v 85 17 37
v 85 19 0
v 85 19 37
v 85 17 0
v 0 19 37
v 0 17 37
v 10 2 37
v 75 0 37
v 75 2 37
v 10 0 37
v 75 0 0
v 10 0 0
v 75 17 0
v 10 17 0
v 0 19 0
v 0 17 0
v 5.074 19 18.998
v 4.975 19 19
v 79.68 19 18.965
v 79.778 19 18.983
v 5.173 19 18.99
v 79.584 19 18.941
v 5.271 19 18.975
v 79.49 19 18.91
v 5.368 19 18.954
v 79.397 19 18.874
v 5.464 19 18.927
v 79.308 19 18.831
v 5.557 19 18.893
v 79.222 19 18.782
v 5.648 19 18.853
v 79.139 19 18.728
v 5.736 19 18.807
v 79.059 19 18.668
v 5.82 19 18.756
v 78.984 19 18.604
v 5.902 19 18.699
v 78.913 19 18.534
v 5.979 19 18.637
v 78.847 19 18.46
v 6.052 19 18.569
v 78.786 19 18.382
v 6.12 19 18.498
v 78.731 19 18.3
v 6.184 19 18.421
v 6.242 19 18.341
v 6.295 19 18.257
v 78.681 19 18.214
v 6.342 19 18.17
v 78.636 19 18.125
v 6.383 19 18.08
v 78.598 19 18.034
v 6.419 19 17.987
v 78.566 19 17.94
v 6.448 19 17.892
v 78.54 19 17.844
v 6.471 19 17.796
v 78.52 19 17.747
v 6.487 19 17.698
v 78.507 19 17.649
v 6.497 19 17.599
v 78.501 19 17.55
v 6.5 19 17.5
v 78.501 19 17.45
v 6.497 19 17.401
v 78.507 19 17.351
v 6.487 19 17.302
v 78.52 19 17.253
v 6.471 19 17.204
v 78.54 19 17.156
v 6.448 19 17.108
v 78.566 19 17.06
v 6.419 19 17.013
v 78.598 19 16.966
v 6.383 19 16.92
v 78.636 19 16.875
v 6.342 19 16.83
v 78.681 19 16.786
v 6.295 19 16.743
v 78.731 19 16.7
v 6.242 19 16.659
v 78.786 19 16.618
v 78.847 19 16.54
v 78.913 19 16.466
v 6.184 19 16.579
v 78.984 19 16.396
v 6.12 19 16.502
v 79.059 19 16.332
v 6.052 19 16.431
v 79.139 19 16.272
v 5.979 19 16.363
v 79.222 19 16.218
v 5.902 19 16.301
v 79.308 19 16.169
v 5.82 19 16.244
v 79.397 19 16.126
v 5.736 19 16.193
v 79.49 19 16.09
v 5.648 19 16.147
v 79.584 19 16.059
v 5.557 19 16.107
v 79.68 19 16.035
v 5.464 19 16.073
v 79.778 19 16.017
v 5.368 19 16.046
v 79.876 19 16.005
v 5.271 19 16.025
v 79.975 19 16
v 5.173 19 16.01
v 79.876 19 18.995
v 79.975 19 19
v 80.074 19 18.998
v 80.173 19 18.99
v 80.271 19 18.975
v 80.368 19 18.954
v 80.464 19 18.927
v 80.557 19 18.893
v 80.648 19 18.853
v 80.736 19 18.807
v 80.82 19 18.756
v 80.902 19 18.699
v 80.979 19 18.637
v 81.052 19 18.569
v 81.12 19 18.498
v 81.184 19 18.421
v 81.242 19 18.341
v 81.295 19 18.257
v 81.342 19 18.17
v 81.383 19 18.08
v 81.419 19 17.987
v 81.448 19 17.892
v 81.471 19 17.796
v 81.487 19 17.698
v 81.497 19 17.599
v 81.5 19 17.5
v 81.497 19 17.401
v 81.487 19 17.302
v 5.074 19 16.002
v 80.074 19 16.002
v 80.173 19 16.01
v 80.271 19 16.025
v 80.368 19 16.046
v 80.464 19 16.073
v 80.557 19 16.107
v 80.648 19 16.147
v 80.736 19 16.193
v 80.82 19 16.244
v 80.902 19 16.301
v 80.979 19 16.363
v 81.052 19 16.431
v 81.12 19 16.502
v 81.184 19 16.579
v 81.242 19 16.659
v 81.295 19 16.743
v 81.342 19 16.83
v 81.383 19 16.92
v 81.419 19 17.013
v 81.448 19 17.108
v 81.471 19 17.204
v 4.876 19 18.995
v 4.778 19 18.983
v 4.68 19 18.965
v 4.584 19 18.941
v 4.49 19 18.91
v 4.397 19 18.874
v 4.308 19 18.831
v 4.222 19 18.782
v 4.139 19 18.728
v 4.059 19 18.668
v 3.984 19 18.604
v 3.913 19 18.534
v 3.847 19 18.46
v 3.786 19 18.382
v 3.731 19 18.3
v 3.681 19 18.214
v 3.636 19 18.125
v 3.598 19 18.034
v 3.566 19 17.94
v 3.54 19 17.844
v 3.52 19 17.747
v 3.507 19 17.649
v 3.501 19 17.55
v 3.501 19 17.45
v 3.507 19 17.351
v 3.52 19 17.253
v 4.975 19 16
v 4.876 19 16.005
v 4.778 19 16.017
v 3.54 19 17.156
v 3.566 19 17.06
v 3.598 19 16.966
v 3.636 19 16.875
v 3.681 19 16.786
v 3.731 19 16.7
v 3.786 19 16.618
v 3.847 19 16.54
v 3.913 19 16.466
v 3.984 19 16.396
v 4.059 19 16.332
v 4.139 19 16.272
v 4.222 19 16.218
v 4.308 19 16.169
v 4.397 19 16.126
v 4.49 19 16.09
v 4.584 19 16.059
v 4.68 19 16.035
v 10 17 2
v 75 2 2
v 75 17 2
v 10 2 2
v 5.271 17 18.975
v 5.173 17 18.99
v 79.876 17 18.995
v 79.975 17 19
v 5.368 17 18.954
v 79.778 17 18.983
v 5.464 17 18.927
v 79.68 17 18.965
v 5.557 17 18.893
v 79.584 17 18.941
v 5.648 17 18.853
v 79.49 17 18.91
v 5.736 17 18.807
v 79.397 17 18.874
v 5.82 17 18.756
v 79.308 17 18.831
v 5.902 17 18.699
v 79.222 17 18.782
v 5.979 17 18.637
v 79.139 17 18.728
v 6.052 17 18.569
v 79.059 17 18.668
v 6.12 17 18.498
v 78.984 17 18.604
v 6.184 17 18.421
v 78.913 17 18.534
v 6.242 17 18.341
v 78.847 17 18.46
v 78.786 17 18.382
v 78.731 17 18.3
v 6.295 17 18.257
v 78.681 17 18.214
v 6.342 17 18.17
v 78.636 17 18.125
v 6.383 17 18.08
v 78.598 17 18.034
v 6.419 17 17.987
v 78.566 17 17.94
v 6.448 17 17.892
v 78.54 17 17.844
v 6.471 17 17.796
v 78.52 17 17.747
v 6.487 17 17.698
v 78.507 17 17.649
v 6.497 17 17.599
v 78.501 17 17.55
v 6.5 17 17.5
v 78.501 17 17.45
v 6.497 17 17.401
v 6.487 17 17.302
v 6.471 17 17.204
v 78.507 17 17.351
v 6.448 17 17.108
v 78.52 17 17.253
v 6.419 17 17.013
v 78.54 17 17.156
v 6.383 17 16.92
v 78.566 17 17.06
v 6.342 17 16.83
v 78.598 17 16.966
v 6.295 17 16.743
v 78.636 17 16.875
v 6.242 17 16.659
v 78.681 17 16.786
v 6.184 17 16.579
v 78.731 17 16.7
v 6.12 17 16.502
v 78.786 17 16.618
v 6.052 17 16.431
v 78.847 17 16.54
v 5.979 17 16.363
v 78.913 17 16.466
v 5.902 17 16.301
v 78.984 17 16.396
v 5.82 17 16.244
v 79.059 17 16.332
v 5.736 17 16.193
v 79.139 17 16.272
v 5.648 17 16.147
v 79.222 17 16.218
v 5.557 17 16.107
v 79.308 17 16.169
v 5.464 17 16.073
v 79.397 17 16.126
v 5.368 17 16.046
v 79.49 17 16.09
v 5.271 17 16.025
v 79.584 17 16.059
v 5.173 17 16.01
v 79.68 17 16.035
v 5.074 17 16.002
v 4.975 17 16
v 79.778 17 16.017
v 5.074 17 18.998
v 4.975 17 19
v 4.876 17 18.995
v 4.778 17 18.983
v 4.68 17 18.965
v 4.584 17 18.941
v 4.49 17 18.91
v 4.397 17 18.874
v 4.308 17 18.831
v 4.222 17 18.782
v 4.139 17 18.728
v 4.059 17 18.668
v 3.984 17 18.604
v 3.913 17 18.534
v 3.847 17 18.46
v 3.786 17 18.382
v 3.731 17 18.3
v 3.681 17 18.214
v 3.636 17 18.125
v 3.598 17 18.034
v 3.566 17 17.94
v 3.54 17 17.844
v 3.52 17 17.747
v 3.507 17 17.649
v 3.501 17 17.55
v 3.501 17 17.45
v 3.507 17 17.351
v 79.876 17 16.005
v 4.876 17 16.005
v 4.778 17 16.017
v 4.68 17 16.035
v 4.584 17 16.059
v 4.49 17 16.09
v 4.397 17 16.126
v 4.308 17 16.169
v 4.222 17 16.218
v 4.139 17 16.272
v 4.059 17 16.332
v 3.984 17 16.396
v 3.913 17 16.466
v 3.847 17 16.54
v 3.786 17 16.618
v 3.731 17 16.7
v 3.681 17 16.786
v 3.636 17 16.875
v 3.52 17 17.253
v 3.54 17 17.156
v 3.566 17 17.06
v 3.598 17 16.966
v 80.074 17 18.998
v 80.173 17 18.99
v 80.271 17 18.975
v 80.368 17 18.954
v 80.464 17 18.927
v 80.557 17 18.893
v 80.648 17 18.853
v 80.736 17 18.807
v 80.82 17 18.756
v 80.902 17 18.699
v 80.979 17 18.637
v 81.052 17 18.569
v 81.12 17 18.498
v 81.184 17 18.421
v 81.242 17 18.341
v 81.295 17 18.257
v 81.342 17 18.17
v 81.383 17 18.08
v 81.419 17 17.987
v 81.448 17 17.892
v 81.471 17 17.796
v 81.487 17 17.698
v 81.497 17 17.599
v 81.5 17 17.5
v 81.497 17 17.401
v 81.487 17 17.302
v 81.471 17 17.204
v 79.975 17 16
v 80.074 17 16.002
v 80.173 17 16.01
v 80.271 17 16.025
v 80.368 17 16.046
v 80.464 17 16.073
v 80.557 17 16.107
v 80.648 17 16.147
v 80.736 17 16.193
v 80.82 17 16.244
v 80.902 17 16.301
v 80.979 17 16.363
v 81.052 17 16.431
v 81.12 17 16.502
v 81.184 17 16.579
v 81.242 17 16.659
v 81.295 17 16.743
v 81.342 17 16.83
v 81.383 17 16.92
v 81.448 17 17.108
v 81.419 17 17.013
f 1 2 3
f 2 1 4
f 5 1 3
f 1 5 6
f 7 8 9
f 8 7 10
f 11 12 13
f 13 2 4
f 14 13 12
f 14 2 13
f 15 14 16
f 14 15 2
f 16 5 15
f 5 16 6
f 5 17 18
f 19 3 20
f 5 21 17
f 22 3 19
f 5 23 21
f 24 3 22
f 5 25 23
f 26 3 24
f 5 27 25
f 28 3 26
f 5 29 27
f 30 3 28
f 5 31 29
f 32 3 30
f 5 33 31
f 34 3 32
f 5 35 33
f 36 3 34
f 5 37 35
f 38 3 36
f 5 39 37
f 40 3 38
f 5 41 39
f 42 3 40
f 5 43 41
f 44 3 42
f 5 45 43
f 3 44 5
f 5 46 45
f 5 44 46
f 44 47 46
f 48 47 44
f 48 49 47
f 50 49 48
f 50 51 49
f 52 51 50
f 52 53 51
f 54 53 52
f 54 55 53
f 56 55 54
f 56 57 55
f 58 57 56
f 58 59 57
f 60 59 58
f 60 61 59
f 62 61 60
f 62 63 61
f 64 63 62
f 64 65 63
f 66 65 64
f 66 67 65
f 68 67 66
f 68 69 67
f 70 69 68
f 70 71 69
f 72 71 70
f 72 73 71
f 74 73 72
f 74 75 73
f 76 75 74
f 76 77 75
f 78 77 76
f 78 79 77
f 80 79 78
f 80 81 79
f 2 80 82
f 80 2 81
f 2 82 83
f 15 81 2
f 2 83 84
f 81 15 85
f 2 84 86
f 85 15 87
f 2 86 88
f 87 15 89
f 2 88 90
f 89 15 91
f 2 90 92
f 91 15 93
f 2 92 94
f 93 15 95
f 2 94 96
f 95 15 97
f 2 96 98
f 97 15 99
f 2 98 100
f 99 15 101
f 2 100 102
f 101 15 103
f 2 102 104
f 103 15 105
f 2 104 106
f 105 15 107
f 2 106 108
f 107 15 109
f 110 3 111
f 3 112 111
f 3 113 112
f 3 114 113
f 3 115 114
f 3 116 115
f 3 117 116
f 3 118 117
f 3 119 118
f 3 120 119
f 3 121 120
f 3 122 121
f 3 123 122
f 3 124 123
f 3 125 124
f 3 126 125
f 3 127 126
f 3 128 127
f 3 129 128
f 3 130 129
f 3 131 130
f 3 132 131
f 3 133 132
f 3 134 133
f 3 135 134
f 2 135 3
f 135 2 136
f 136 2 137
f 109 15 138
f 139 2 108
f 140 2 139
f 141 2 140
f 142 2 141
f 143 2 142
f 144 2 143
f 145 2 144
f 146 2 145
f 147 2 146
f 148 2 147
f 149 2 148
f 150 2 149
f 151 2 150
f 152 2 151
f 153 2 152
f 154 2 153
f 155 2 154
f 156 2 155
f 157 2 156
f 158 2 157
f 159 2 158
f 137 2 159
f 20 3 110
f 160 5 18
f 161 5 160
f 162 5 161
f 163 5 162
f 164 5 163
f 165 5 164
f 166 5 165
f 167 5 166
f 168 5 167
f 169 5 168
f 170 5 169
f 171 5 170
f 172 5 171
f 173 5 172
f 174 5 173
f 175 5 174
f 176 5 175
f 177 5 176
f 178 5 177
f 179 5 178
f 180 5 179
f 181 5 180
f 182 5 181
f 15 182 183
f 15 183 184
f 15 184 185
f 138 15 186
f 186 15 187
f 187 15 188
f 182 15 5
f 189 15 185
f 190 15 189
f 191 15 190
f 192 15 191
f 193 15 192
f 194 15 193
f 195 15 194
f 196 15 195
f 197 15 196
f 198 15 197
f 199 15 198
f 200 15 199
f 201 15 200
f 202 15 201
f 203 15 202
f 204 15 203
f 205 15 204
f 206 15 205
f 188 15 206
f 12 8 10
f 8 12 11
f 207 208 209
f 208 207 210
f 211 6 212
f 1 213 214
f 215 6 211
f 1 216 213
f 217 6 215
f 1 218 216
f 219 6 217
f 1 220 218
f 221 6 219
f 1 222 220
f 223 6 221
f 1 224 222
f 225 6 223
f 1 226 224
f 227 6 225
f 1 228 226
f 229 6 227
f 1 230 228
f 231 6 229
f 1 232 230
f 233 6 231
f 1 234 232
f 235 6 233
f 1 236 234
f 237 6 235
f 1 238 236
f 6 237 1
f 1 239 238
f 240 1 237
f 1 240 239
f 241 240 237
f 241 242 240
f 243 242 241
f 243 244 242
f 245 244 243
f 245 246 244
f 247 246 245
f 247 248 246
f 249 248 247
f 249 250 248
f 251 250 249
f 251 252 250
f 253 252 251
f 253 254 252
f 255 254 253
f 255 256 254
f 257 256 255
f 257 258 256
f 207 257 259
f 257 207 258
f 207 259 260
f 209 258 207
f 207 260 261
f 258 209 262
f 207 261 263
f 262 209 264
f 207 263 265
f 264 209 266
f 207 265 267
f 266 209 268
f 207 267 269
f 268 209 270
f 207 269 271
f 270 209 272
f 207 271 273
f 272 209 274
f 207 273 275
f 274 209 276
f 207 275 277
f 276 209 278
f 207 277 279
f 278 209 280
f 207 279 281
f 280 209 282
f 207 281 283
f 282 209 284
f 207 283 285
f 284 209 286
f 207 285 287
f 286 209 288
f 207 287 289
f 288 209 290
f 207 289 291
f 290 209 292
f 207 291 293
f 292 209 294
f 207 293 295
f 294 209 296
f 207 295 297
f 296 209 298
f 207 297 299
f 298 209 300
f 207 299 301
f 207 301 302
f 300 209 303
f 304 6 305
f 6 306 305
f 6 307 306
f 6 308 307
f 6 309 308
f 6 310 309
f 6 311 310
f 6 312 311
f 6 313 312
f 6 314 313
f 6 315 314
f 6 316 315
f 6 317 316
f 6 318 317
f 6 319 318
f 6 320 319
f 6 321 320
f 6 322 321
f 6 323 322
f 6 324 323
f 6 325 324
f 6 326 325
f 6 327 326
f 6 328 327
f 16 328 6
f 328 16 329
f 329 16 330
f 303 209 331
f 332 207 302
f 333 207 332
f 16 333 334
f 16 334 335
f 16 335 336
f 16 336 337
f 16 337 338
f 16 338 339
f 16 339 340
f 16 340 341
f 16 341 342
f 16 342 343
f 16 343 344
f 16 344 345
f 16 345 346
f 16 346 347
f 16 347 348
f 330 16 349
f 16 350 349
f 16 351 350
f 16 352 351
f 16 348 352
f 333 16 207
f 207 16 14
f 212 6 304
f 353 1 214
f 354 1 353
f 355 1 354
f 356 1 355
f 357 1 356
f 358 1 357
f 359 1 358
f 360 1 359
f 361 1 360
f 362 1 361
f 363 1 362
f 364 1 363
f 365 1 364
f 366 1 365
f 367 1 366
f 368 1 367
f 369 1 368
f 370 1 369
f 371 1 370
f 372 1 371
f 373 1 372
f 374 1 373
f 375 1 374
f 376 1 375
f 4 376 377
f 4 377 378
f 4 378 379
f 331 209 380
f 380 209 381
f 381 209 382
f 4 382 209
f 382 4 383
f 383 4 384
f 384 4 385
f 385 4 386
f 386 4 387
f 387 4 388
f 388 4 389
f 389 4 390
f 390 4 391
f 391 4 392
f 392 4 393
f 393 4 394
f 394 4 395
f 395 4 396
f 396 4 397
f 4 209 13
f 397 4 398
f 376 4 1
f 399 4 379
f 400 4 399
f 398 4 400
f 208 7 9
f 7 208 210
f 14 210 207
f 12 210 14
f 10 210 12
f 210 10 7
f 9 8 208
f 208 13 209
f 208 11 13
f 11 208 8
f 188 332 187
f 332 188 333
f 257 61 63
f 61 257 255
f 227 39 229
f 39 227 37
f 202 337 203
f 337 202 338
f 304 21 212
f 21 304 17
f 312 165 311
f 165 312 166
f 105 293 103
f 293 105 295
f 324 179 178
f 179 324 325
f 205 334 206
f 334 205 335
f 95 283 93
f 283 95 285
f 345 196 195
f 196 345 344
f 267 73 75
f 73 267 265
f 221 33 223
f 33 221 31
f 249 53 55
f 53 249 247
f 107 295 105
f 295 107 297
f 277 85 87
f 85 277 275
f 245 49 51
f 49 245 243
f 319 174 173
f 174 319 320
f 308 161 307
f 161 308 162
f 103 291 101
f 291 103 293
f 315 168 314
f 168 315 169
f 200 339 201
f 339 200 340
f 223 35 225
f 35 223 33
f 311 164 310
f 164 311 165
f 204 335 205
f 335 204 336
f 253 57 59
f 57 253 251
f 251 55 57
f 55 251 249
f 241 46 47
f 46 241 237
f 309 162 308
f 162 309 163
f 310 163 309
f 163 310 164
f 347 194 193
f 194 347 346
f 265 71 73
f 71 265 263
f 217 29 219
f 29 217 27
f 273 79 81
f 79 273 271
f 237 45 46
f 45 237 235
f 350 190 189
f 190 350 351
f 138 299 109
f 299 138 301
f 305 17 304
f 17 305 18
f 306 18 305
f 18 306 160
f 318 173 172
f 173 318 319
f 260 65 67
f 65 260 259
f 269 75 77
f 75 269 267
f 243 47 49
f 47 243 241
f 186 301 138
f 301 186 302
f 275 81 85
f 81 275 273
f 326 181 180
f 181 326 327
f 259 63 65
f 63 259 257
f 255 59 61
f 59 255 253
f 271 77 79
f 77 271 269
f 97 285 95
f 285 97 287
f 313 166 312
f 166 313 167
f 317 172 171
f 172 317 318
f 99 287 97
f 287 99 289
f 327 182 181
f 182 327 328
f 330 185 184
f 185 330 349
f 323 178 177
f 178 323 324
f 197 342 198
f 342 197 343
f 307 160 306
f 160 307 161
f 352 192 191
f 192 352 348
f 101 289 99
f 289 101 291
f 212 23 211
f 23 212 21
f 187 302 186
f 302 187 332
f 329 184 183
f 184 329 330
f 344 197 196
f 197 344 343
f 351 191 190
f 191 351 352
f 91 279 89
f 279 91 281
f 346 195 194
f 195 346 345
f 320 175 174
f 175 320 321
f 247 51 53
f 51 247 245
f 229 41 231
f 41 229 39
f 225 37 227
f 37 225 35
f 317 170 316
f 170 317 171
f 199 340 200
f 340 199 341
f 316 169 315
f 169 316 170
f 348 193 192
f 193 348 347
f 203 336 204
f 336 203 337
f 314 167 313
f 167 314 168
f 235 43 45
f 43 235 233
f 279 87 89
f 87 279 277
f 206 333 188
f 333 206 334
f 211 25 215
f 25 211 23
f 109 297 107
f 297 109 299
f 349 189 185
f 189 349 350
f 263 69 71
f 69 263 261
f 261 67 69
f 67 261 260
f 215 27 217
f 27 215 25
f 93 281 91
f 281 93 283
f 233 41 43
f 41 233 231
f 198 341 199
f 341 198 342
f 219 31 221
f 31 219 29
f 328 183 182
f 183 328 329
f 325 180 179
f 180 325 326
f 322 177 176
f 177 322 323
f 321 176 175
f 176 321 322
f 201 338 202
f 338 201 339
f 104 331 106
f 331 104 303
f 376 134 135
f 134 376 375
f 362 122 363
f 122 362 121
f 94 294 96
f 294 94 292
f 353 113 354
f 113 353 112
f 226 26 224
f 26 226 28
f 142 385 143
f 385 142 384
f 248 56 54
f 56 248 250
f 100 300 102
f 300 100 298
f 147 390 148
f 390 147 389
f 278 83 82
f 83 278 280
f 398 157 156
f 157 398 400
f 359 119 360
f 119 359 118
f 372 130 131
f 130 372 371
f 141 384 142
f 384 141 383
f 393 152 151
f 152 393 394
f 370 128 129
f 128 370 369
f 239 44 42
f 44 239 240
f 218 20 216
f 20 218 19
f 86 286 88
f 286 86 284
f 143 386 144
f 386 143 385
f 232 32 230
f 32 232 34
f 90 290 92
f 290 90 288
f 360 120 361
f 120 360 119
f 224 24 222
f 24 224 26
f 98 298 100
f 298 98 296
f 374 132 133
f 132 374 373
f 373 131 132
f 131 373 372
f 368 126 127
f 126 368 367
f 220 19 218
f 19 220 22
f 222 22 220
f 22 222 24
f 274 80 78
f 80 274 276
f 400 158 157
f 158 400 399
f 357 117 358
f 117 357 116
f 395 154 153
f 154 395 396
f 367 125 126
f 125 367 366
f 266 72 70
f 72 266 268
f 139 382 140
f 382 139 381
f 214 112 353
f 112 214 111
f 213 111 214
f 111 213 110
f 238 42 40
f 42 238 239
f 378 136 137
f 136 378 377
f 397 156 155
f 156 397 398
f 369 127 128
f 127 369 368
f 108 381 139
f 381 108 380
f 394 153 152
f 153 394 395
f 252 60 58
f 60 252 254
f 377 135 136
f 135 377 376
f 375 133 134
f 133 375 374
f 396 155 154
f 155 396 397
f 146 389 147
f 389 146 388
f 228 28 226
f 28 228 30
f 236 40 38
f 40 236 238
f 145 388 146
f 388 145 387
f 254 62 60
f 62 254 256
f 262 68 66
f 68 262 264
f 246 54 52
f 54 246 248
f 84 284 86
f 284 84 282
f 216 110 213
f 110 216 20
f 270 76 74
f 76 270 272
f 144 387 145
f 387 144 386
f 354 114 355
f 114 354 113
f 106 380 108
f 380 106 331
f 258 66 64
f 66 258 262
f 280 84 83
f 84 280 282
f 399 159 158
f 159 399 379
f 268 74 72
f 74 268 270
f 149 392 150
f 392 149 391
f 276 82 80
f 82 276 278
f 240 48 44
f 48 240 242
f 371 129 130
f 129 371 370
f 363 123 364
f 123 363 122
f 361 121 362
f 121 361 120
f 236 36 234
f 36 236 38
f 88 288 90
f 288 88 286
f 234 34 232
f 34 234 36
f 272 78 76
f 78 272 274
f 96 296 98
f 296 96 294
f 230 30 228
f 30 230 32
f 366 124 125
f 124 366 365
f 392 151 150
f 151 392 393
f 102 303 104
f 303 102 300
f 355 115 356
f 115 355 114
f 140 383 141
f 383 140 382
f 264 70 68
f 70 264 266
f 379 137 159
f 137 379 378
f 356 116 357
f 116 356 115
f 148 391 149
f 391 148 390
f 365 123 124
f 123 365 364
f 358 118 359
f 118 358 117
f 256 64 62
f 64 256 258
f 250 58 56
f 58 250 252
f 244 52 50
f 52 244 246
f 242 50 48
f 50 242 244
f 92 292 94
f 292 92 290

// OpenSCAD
size_x = 65;
size_y = 15;
size_z = 35;
wall = 2;
screw_d = 3;

$fa = 0.1;
$fs = 0.1;

difference(){
    cube([size_x + 20, size_y + 2 * wall, size_z + wall]);
    translate([-1, wall, wall]) cube([size_x + 22, size_y, size_z + 1]);

    translate([-1, -1, -1]) cube([11, size_y + wall + 1, size_z + wall + 2]);
    translate([size_x + 10, -1, -1]) cube([11, size_y + wall + 1, size_z + wall + 2]);

    translate([5, size_y + 2 * wall + 1, size_z / 2]) rotate([90, 0, 0]) cylinder(h = wall + 2, d = screw_d);
    translate([size_x + 15, size_y + 2 * wall + 1, size_z / 2]) rotate([90, 0, 0]) cylinder(h = wall + 2, d = screw_d);
}
